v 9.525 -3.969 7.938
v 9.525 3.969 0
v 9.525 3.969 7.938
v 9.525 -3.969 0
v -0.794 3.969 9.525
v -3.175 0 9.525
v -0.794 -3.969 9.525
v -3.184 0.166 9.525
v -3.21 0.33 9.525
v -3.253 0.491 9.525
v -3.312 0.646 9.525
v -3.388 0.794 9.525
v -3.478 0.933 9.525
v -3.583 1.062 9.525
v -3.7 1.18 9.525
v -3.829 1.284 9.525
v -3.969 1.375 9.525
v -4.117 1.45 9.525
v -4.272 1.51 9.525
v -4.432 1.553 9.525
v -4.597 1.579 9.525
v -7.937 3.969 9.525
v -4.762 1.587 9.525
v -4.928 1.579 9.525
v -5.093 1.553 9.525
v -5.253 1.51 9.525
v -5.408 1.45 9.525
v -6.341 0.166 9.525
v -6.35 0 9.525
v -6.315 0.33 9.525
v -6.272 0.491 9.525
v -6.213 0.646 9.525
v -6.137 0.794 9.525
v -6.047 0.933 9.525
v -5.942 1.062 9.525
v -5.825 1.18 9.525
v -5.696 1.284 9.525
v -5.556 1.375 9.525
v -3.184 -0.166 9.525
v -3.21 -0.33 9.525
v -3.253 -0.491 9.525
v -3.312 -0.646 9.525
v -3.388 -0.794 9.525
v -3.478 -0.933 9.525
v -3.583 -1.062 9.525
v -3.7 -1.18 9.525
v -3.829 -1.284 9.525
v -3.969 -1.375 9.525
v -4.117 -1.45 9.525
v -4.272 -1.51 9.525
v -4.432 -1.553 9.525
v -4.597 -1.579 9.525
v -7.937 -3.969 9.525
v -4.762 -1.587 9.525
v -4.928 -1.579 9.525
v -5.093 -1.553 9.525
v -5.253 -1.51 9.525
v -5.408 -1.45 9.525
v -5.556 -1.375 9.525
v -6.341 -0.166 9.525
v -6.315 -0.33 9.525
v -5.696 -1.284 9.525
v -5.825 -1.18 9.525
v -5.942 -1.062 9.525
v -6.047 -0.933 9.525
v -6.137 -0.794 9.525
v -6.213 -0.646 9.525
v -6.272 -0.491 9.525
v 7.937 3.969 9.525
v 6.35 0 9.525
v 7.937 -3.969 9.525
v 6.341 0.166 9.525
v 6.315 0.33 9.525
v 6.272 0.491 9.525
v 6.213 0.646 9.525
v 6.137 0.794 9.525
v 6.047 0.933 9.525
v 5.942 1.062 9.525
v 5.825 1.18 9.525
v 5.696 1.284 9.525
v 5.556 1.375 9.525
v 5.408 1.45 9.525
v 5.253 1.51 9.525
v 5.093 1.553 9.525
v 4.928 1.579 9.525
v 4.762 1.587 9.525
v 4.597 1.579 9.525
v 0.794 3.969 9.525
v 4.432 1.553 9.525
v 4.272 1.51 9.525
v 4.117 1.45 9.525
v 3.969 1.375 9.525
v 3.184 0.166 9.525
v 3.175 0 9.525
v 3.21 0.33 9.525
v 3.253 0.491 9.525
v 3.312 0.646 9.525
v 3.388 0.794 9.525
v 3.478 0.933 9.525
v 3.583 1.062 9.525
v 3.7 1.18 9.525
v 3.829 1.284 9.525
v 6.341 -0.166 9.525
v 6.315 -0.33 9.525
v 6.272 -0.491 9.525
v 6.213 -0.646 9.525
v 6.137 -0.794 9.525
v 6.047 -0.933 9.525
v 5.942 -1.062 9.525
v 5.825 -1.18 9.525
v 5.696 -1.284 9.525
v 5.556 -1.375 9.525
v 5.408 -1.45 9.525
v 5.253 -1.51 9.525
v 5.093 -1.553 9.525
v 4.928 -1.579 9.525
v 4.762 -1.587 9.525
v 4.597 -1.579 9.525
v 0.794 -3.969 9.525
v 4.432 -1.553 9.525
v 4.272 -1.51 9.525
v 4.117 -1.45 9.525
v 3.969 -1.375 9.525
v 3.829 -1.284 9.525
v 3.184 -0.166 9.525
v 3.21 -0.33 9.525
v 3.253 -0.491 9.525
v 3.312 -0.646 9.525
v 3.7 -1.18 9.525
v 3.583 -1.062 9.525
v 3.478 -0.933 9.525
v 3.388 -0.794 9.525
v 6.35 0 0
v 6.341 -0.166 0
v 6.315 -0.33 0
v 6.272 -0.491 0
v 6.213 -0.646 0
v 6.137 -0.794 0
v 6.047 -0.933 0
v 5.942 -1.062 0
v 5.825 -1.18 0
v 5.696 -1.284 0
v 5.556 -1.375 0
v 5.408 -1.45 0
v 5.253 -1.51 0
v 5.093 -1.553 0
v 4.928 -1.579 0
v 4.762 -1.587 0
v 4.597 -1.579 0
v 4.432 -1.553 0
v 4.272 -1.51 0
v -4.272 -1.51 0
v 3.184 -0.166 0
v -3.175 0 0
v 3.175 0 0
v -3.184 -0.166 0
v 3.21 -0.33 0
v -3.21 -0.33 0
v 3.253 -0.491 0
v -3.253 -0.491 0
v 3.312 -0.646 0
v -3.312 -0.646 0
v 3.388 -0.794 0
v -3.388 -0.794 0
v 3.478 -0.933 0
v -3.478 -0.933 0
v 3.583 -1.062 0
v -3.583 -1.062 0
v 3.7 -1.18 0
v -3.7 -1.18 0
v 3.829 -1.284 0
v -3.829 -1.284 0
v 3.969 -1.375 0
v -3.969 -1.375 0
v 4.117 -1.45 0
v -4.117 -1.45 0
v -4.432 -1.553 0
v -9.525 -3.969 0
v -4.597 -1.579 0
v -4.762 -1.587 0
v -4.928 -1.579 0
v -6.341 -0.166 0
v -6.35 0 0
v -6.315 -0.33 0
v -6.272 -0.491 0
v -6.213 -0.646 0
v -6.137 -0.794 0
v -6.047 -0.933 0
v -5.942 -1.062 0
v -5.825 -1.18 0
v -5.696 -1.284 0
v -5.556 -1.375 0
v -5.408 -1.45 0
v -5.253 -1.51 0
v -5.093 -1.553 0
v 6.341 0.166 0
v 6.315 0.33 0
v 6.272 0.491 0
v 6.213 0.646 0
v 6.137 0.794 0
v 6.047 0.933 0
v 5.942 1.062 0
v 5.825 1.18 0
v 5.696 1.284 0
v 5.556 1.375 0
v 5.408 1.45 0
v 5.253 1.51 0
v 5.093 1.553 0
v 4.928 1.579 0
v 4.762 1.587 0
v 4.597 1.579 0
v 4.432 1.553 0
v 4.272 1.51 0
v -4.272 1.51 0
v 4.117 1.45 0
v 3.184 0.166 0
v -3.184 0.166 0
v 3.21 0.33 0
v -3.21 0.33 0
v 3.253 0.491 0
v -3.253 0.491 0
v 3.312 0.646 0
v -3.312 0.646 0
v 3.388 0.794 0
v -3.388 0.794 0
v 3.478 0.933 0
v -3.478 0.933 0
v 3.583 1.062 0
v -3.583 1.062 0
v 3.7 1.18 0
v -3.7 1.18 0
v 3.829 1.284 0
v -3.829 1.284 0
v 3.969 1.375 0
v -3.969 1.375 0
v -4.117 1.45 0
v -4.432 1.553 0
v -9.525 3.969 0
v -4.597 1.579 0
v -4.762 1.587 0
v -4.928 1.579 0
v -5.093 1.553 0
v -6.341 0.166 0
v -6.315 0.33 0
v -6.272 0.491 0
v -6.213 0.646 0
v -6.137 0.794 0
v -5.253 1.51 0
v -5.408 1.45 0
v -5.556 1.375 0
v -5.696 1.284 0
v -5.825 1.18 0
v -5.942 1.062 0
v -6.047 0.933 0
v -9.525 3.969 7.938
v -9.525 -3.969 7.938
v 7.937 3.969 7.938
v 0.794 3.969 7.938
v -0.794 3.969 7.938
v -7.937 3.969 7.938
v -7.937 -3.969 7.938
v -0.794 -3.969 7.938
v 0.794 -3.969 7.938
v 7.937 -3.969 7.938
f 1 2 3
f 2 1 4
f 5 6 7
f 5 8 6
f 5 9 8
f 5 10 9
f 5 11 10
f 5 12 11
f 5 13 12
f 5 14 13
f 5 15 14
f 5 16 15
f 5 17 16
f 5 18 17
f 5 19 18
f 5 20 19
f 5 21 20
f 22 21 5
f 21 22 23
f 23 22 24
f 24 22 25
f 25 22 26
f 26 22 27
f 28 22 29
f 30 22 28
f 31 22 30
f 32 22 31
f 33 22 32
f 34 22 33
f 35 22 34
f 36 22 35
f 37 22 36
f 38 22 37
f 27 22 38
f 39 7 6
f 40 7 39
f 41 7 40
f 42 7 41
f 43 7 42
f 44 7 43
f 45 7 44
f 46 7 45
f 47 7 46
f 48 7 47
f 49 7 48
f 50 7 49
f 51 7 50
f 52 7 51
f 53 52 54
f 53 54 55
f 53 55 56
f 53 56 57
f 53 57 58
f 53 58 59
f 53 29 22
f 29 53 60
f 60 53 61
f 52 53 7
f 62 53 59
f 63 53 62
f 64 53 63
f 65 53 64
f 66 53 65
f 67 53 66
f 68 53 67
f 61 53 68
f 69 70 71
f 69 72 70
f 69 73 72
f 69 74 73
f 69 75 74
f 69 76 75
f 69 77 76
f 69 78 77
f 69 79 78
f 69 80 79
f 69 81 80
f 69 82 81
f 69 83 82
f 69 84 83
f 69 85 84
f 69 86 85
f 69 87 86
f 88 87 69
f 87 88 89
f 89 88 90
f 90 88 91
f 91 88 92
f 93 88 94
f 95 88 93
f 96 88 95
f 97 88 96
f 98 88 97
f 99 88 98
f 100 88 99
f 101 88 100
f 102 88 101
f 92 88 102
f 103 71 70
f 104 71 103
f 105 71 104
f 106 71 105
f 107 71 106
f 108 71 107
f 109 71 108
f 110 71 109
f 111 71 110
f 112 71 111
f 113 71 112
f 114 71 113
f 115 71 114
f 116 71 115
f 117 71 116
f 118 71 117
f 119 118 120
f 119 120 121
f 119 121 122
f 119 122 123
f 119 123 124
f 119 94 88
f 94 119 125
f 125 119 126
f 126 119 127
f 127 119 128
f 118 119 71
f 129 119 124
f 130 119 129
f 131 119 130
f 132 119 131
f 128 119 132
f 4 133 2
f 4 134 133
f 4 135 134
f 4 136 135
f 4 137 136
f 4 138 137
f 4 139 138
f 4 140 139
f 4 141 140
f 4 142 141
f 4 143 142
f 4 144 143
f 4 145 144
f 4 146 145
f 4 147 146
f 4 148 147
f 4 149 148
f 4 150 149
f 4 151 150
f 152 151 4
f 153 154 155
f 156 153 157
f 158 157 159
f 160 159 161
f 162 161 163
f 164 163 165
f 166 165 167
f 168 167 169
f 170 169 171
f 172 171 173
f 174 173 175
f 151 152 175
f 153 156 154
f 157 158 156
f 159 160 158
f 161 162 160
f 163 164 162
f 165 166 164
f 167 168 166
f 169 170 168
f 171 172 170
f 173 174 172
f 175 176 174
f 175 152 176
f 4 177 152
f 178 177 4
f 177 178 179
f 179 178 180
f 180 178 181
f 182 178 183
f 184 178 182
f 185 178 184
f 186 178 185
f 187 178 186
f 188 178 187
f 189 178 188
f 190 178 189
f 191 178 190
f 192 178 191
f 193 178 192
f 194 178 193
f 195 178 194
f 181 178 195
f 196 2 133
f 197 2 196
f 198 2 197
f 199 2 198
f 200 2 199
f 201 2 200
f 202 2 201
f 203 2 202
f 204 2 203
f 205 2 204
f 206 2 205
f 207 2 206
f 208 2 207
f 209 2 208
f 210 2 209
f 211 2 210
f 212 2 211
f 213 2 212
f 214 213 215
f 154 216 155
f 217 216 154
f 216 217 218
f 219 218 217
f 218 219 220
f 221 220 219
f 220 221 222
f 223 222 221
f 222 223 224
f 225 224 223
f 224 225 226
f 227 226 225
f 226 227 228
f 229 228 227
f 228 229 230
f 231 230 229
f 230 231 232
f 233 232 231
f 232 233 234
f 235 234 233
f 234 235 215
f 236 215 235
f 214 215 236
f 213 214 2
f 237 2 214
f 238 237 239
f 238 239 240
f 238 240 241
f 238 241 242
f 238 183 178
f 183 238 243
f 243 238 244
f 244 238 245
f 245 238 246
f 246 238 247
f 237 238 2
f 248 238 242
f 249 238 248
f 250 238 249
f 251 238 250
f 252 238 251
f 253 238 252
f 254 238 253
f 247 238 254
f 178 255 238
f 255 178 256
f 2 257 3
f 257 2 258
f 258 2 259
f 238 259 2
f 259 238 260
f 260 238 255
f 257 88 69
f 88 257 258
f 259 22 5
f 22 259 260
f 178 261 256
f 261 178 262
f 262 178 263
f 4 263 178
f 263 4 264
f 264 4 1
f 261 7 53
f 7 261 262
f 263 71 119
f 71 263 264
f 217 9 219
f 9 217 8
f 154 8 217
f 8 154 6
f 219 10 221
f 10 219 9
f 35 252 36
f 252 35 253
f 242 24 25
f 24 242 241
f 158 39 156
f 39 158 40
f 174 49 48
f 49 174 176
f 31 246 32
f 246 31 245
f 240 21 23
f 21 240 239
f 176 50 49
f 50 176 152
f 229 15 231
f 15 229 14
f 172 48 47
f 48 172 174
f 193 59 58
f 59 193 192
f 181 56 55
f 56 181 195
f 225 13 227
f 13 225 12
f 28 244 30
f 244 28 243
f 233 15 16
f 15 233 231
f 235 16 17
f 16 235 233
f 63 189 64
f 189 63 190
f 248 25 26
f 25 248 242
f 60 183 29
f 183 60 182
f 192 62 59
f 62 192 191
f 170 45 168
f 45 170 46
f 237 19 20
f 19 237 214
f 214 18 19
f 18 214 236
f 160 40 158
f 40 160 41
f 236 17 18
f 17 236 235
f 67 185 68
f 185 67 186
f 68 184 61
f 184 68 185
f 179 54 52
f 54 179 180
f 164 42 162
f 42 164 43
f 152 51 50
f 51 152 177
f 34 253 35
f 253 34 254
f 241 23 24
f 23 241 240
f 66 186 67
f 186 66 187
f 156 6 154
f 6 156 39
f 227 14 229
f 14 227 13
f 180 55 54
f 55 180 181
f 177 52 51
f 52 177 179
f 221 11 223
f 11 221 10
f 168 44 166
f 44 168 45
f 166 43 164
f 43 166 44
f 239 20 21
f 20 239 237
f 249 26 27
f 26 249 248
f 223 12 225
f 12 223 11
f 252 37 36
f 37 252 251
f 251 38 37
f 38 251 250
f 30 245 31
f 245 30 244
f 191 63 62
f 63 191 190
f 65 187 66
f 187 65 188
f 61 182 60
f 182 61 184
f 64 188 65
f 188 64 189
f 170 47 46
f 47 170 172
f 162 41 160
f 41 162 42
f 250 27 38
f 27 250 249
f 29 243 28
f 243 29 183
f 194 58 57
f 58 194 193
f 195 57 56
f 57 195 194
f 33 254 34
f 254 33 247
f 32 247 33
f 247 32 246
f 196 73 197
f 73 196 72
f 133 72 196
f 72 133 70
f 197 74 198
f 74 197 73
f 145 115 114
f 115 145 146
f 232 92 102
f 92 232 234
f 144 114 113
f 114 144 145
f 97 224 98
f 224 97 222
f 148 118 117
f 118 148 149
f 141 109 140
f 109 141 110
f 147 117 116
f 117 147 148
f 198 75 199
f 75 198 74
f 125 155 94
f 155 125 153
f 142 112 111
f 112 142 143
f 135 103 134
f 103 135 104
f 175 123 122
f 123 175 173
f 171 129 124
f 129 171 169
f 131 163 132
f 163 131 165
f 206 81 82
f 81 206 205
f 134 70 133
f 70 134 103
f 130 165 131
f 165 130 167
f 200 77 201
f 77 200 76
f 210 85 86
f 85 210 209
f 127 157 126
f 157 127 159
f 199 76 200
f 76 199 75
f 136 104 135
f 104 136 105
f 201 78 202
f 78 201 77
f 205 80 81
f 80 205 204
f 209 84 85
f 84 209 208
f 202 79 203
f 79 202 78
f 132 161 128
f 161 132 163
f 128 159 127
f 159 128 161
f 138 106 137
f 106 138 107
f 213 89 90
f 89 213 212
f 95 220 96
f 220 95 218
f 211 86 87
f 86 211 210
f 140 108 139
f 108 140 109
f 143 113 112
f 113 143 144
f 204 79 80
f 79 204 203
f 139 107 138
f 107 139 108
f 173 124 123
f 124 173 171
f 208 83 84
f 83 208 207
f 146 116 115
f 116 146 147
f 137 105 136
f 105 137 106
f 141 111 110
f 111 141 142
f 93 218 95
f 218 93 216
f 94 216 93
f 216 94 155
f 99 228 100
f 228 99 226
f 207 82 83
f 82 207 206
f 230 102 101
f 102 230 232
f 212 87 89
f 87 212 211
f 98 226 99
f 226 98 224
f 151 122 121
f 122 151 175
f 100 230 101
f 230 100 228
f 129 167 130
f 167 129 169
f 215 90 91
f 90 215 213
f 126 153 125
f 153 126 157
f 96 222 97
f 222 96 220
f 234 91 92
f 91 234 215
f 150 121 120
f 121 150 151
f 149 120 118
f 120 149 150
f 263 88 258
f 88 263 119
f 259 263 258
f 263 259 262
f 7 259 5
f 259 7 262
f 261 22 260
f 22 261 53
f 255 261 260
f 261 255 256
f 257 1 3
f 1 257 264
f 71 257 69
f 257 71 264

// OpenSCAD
// Breadboard retention clip: base part

// All units in mm

base_h = 9.525;      // 3/8 in
base_l = 3 * 6.35;   // 3/4 in
base_w = base_h - 1.5875; // 5/16 in

fudge = 0.02;

hole_r = 3.175/2;     // 1/8" diameter

guide = 1.5875;      // 1/16 in

module body() {
    translate([-base_l/2, -base_w/2, 0])
        cube([base_l, base_w, base_h]);
}

module screw_hole() {
    // screw hole    
    cylinder(r=hole_r, h=base_h + 2*fudge);
}

module guide(extra_w, dx) {
    translate([-guide/2+dx, -base_w/2-fudge, 0])
        cube([guide+extra_w, base_w+2*fudge, guide+fudge]);
}

module base() {
    difference() {
        body();

        translate([-base_l/4, 0, -fudge]) screw_hole();

        translate([base_l/4, 0, -fudge]) screw_hole();
        
        // center guide
        translate([0, 0, base_h-guide]) guide(0, 0);
        
        // left guide
        translate([-base_l/2 + guide/2, 0, base_h-guide]) guide(fudge, -fudge);
        
        // right guide
        translate([base_l/2 - guide/2, 0, base_h-guide]) guide(fudge, 0);
    }
}

$fn = 60;

base();

// base_h-guide

//guide();
